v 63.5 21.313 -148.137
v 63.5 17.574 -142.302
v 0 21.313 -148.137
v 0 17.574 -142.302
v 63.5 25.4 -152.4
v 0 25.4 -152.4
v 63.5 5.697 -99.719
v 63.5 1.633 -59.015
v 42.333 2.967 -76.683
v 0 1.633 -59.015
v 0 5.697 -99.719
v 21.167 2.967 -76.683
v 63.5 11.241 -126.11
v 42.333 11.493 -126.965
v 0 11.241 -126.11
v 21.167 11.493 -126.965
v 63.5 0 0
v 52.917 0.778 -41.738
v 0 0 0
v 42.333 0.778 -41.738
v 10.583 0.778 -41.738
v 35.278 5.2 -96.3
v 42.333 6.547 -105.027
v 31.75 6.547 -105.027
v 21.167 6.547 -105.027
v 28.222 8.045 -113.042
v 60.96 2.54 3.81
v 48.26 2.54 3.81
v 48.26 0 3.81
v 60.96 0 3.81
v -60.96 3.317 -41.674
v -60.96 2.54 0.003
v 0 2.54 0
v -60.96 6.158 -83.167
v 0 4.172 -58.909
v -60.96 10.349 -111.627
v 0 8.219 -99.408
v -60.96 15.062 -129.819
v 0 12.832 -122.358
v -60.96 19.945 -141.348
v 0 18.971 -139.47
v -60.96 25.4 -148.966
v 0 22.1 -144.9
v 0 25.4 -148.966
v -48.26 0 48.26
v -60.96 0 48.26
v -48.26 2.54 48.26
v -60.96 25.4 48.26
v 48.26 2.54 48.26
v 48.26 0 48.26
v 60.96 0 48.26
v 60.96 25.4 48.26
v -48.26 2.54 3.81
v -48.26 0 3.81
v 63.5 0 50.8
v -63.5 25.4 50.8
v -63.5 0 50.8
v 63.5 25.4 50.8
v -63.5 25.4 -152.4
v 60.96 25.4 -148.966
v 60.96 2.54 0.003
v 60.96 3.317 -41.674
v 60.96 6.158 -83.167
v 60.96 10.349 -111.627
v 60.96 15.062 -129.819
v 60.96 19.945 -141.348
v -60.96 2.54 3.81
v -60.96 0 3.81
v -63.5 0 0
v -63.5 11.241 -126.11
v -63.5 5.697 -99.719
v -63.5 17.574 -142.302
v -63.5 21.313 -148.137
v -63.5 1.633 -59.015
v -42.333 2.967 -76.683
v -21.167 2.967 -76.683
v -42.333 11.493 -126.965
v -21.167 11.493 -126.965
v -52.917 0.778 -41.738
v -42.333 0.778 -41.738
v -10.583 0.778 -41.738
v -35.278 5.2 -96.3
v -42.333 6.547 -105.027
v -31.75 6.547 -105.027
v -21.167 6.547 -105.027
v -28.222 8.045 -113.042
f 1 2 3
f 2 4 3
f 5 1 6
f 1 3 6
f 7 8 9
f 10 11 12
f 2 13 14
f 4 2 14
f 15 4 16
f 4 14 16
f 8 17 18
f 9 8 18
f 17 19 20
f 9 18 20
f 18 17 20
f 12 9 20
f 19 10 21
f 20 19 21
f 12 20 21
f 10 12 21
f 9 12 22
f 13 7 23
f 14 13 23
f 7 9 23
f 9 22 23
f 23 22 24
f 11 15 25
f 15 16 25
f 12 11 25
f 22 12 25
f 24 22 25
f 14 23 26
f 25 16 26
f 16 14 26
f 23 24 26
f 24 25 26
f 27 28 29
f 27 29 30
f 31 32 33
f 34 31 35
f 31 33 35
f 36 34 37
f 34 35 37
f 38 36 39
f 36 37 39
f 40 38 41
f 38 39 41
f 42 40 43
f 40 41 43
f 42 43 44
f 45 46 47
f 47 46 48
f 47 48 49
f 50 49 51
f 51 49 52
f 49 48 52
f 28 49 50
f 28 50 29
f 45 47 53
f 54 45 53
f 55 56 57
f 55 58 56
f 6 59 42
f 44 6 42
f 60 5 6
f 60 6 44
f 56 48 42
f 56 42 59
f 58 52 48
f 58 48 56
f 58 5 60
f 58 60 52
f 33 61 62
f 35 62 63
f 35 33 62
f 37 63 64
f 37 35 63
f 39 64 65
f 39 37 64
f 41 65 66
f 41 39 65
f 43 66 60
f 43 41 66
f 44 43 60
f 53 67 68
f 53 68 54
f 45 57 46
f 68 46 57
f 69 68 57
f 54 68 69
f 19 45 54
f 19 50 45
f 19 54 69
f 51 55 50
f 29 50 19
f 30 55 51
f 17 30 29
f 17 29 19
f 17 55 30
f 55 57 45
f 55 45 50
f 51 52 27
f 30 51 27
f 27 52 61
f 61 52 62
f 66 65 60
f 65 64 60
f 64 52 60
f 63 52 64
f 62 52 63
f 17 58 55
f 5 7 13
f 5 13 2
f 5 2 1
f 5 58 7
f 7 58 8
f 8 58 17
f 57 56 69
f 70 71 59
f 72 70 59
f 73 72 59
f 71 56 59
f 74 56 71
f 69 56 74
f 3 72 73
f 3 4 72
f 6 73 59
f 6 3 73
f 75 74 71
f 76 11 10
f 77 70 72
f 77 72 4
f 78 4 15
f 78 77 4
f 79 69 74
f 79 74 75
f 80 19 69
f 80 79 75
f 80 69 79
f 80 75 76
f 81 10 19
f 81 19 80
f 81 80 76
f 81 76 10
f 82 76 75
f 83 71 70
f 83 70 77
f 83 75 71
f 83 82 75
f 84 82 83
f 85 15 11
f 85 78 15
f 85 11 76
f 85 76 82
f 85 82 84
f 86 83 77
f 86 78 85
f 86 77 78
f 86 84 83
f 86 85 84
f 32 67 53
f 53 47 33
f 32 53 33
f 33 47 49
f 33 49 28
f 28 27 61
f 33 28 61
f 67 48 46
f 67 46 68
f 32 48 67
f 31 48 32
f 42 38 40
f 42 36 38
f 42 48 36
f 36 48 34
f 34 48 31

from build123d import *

# Parameters (mm, degrees)
BOSS_EXTRUDE1_DEPTH = 63.5
SHELL1_T            = -2.54
SKETCH4_W           = 12.7
SKETCH4_H           = 44.45
CUT_EXTRUDE1_DEPTH  = 168.042419907


with BuildPart() as part:
    # Sketch1 → Boss-Extrude1 (new, symmetric)
    with BuildSketch(Plane(origin=(0, 0, 0), x_dir=(0, 0, -1), z_dir=(1, 0, 0))):
        with BuildLine():
            Line((-50.8, 25.4), (-50.8, 0))
            Line((-50.8, 0), (0, 0))
            add(Edge.make_bspline(
                [(0, 0), (90.399909762, 0.128526821), (138.872298675, 8.862290589), (152.4, 25.4)],
                knots=[0, 0, 0, 0, 1, 1, 1, 1], degree=3))
            Line((152.4, 25.4), (-50.8, 25.4))
        make_face()
    extrude(amount=BOSS_EXTRUDE1_DEPTH, both=True)

    # Shell1
    shell1_openings = [part.faces().sort_by_distance(p)[0] for p in [
        (0, 25.4, -50.8),
    ]]
    offset(amount=SHELL1_T, openings=shell1_openings, kind=Kind.INTERSECTION)

    # Sketch4 → Cut-Extrude1 (cut, through all)
    with BuildSketch(Plane(origin=(0, 25.4, 0), x_dir=(1, 0, 0), z_dir=(0, 1, 0))):
        with Locations((-54.61, -26.035)):
            Rectangle(SKETCH4_W, SKETCH4_H)
        with Locations((54.61, -26.035)):
            Rectangle(SKETCH4_W, SKETCH4_H)
    extrude(amount=-CUT_EXTRUDE1_DEPTH, mode=Mode.SUBTRACT)


solid = part.part
